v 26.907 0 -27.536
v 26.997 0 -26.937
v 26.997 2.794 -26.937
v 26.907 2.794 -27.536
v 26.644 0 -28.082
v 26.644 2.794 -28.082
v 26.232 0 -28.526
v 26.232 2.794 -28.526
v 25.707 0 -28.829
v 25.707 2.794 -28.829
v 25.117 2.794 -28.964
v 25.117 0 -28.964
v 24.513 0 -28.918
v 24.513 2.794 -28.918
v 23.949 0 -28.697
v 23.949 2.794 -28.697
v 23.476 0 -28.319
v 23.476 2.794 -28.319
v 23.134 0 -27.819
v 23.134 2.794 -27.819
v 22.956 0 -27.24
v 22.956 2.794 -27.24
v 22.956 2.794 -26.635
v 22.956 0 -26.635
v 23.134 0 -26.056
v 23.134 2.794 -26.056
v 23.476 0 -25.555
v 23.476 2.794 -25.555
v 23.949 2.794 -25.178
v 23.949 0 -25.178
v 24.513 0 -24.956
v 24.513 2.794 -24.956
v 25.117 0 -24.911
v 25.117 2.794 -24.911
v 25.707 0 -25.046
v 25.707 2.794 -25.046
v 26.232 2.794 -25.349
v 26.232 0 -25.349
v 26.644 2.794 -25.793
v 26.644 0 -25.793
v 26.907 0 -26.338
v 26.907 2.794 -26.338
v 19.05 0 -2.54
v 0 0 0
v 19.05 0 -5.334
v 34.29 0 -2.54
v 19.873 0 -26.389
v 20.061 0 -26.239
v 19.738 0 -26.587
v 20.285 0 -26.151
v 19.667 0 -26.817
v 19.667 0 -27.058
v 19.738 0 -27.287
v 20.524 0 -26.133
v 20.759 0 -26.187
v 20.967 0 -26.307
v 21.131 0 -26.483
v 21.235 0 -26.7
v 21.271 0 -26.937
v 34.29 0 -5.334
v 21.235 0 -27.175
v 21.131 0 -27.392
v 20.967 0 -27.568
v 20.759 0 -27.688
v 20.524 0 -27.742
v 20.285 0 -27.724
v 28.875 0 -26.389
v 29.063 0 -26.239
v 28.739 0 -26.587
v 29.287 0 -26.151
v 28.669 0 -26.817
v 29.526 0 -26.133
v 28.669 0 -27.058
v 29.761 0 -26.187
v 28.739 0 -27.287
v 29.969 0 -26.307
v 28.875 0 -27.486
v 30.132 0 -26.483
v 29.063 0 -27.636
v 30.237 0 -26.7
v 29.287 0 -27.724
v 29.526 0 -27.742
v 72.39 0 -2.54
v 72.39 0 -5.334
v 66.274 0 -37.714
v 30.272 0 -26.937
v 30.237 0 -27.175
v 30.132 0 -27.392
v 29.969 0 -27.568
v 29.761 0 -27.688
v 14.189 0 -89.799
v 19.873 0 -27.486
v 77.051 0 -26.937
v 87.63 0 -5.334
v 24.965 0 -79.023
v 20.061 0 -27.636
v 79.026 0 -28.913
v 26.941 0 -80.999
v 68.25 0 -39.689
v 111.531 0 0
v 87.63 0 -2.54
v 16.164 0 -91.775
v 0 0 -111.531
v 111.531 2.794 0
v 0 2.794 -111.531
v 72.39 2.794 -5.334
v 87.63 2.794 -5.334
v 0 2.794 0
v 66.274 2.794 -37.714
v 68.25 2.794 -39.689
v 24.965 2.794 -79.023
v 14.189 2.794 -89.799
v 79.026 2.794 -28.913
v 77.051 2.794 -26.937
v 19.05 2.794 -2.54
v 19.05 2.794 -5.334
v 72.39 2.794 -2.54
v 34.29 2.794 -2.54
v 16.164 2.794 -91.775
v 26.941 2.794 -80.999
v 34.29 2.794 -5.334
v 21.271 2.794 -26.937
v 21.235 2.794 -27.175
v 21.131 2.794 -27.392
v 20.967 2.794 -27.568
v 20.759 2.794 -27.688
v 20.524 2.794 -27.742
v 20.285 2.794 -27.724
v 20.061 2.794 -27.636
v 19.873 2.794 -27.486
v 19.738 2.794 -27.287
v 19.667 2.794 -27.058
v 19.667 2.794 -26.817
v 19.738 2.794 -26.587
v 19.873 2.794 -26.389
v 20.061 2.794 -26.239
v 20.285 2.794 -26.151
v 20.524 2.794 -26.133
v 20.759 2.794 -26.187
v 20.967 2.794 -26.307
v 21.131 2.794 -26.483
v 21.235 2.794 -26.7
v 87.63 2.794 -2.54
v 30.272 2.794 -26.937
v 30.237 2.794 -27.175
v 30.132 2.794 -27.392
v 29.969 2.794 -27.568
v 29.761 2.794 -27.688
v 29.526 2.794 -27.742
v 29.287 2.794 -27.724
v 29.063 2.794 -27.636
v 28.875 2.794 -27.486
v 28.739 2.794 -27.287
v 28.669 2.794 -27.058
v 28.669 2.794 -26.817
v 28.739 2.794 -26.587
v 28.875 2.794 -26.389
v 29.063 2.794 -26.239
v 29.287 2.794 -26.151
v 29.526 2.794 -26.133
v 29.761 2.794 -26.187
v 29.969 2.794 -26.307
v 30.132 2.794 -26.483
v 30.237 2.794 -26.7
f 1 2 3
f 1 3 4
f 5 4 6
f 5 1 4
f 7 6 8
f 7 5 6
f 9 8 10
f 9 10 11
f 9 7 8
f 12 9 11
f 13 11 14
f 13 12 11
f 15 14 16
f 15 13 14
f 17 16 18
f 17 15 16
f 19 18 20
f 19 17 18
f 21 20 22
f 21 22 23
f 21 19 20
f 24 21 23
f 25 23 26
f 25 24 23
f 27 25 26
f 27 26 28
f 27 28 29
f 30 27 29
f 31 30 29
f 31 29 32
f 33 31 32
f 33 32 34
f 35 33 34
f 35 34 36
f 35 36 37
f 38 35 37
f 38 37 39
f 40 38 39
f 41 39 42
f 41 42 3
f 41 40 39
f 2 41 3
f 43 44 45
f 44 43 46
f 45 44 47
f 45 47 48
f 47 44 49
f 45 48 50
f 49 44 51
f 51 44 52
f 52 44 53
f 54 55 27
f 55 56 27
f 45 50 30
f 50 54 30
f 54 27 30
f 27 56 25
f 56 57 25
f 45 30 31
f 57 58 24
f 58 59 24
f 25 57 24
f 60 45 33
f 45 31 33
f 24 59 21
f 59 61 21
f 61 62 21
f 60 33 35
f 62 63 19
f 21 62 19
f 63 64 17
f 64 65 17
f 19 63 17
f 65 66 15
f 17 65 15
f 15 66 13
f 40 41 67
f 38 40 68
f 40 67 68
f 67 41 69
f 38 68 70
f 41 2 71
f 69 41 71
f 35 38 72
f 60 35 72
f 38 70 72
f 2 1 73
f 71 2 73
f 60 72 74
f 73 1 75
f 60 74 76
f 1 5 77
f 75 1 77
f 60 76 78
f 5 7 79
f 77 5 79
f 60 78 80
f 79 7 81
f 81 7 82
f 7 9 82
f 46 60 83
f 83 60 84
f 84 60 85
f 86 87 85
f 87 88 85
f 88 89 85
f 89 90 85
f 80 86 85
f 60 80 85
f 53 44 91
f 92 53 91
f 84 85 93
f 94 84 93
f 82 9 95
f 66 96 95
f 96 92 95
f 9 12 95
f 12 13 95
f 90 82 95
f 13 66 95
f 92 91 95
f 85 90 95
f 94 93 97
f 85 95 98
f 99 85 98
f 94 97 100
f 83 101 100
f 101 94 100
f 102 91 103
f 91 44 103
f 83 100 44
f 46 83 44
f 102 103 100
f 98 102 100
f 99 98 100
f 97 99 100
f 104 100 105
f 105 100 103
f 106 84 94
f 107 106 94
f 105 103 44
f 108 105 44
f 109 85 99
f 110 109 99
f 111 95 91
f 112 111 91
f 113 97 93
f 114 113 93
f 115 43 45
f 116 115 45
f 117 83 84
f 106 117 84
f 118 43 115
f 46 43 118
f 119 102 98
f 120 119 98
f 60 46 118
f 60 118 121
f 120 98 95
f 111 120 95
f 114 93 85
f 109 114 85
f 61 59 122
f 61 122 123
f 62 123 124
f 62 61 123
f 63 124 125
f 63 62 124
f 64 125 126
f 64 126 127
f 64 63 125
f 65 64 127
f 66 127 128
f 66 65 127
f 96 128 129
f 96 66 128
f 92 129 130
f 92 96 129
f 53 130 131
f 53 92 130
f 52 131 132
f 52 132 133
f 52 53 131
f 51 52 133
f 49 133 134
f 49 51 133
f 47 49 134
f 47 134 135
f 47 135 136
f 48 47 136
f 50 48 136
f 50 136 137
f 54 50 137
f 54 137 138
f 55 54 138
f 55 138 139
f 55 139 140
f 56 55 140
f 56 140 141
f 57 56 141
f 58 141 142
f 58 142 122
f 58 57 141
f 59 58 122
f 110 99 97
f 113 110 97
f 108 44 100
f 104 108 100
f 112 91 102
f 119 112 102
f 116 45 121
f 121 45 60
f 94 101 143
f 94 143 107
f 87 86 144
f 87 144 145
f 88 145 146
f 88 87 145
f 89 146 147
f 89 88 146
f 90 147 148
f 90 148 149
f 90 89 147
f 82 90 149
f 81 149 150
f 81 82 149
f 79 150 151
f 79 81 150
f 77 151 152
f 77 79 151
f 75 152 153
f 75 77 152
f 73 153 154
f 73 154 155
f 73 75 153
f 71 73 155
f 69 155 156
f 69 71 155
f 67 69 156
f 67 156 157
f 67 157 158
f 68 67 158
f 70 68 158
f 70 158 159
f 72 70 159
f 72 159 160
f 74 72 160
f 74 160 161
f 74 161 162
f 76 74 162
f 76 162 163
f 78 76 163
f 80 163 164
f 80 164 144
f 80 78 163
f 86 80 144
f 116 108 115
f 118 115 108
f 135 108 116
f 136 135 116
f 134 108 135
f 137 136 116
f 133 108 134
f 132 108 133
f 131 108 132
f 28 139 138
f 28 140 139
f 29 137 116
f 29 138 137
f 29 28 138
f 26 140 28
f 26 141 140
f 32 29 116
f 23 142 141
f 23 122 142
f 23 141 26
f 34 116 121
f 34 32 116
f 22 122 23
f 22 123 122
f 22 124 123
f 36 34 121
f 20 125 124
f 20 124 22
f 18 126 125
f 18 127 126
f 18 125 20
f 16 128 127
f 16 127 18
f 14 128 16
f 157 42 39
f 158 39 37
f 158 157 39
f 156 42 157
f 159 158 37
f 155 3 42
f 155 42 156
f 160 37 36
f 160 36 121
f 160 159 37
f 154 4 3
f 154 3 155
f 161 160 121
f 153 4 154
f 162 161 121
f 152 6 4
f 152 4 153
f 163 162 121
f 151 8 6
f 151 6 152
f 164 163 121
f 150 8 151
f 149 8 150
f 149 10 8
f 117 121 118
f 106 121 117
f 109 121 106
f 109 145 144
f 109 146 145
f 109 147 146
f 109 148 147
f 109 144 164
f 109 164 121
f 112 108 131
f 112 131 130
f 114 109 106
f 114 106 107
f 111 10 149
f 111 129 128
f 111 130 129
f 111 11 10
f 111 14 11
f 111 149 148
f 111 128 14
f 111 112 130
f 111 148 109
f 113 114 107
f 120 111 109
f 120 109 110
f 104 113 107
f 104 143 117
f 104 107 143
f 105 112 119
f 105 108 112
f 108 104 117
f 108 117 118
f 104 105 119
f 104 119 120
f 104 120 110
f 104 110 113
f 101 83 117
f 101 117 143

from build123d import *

# Parameters (mm, degrees)
SKETCH1_R           = 2.032
SKETCH1_R_2         = 0.80645
SKETCH1_W           = 15.24
SKETCH1_H           = 2.794
BOSS_EXTRUDE1_DEPTH = 2.794


with BuildPart() as part:
    # Sketch1 → Boss-Extrude1 (new body)
    with BuildSketch(Plane(origin=(0, 0, 0), x_dir=(1, 0, 0), z_dir=(0, 1, 0))):
        Polygon((0, 0), (111.5314, 0), (0, 111.5314), align=None)
        with Locations((24.965112017, 26.93738734)):
            Circle(SKETCH1_R, mode=Mode.SUBTRACT)
        with Locations((20.464232017, 26.93738734)):
            Circle(SKETCH1_R_2, mode=Mode.SUBTRACT)
        with Locations((29.465992017, 26.93738734)):
            Circle(SKETCH1_R_2, mode=Mode.SUBTRACT)
        with Locations((26.67, 3.937)):
            Rectangle(SKETCH1_W, SKETCH1_H, mode=Mode.SUBTRACT)
        with Locations((80.01, 3.937)):
            Rectangle(SKETCH1_W, SKETCH1_H, mode=Mode.SUBTRACT)
        Polygon((16.164461018, 91.774836534), (26.940768363, 80.998529188), (24.965112017, 79.022872842), (14.188804671, 89.799180187), align=None, mode=Mode.SUBTRACT)
        Polygon((68.24994652, 39.689351031), (79.026253865, 28.913043686), (77.050597519, 26.93738734), (66.274290173, 37.713694685), align=None, mode=Mode.SUBTRACT)
    extrude(amount=BOSS_EXTRUDE1_DEPTH)


solid = part.part
